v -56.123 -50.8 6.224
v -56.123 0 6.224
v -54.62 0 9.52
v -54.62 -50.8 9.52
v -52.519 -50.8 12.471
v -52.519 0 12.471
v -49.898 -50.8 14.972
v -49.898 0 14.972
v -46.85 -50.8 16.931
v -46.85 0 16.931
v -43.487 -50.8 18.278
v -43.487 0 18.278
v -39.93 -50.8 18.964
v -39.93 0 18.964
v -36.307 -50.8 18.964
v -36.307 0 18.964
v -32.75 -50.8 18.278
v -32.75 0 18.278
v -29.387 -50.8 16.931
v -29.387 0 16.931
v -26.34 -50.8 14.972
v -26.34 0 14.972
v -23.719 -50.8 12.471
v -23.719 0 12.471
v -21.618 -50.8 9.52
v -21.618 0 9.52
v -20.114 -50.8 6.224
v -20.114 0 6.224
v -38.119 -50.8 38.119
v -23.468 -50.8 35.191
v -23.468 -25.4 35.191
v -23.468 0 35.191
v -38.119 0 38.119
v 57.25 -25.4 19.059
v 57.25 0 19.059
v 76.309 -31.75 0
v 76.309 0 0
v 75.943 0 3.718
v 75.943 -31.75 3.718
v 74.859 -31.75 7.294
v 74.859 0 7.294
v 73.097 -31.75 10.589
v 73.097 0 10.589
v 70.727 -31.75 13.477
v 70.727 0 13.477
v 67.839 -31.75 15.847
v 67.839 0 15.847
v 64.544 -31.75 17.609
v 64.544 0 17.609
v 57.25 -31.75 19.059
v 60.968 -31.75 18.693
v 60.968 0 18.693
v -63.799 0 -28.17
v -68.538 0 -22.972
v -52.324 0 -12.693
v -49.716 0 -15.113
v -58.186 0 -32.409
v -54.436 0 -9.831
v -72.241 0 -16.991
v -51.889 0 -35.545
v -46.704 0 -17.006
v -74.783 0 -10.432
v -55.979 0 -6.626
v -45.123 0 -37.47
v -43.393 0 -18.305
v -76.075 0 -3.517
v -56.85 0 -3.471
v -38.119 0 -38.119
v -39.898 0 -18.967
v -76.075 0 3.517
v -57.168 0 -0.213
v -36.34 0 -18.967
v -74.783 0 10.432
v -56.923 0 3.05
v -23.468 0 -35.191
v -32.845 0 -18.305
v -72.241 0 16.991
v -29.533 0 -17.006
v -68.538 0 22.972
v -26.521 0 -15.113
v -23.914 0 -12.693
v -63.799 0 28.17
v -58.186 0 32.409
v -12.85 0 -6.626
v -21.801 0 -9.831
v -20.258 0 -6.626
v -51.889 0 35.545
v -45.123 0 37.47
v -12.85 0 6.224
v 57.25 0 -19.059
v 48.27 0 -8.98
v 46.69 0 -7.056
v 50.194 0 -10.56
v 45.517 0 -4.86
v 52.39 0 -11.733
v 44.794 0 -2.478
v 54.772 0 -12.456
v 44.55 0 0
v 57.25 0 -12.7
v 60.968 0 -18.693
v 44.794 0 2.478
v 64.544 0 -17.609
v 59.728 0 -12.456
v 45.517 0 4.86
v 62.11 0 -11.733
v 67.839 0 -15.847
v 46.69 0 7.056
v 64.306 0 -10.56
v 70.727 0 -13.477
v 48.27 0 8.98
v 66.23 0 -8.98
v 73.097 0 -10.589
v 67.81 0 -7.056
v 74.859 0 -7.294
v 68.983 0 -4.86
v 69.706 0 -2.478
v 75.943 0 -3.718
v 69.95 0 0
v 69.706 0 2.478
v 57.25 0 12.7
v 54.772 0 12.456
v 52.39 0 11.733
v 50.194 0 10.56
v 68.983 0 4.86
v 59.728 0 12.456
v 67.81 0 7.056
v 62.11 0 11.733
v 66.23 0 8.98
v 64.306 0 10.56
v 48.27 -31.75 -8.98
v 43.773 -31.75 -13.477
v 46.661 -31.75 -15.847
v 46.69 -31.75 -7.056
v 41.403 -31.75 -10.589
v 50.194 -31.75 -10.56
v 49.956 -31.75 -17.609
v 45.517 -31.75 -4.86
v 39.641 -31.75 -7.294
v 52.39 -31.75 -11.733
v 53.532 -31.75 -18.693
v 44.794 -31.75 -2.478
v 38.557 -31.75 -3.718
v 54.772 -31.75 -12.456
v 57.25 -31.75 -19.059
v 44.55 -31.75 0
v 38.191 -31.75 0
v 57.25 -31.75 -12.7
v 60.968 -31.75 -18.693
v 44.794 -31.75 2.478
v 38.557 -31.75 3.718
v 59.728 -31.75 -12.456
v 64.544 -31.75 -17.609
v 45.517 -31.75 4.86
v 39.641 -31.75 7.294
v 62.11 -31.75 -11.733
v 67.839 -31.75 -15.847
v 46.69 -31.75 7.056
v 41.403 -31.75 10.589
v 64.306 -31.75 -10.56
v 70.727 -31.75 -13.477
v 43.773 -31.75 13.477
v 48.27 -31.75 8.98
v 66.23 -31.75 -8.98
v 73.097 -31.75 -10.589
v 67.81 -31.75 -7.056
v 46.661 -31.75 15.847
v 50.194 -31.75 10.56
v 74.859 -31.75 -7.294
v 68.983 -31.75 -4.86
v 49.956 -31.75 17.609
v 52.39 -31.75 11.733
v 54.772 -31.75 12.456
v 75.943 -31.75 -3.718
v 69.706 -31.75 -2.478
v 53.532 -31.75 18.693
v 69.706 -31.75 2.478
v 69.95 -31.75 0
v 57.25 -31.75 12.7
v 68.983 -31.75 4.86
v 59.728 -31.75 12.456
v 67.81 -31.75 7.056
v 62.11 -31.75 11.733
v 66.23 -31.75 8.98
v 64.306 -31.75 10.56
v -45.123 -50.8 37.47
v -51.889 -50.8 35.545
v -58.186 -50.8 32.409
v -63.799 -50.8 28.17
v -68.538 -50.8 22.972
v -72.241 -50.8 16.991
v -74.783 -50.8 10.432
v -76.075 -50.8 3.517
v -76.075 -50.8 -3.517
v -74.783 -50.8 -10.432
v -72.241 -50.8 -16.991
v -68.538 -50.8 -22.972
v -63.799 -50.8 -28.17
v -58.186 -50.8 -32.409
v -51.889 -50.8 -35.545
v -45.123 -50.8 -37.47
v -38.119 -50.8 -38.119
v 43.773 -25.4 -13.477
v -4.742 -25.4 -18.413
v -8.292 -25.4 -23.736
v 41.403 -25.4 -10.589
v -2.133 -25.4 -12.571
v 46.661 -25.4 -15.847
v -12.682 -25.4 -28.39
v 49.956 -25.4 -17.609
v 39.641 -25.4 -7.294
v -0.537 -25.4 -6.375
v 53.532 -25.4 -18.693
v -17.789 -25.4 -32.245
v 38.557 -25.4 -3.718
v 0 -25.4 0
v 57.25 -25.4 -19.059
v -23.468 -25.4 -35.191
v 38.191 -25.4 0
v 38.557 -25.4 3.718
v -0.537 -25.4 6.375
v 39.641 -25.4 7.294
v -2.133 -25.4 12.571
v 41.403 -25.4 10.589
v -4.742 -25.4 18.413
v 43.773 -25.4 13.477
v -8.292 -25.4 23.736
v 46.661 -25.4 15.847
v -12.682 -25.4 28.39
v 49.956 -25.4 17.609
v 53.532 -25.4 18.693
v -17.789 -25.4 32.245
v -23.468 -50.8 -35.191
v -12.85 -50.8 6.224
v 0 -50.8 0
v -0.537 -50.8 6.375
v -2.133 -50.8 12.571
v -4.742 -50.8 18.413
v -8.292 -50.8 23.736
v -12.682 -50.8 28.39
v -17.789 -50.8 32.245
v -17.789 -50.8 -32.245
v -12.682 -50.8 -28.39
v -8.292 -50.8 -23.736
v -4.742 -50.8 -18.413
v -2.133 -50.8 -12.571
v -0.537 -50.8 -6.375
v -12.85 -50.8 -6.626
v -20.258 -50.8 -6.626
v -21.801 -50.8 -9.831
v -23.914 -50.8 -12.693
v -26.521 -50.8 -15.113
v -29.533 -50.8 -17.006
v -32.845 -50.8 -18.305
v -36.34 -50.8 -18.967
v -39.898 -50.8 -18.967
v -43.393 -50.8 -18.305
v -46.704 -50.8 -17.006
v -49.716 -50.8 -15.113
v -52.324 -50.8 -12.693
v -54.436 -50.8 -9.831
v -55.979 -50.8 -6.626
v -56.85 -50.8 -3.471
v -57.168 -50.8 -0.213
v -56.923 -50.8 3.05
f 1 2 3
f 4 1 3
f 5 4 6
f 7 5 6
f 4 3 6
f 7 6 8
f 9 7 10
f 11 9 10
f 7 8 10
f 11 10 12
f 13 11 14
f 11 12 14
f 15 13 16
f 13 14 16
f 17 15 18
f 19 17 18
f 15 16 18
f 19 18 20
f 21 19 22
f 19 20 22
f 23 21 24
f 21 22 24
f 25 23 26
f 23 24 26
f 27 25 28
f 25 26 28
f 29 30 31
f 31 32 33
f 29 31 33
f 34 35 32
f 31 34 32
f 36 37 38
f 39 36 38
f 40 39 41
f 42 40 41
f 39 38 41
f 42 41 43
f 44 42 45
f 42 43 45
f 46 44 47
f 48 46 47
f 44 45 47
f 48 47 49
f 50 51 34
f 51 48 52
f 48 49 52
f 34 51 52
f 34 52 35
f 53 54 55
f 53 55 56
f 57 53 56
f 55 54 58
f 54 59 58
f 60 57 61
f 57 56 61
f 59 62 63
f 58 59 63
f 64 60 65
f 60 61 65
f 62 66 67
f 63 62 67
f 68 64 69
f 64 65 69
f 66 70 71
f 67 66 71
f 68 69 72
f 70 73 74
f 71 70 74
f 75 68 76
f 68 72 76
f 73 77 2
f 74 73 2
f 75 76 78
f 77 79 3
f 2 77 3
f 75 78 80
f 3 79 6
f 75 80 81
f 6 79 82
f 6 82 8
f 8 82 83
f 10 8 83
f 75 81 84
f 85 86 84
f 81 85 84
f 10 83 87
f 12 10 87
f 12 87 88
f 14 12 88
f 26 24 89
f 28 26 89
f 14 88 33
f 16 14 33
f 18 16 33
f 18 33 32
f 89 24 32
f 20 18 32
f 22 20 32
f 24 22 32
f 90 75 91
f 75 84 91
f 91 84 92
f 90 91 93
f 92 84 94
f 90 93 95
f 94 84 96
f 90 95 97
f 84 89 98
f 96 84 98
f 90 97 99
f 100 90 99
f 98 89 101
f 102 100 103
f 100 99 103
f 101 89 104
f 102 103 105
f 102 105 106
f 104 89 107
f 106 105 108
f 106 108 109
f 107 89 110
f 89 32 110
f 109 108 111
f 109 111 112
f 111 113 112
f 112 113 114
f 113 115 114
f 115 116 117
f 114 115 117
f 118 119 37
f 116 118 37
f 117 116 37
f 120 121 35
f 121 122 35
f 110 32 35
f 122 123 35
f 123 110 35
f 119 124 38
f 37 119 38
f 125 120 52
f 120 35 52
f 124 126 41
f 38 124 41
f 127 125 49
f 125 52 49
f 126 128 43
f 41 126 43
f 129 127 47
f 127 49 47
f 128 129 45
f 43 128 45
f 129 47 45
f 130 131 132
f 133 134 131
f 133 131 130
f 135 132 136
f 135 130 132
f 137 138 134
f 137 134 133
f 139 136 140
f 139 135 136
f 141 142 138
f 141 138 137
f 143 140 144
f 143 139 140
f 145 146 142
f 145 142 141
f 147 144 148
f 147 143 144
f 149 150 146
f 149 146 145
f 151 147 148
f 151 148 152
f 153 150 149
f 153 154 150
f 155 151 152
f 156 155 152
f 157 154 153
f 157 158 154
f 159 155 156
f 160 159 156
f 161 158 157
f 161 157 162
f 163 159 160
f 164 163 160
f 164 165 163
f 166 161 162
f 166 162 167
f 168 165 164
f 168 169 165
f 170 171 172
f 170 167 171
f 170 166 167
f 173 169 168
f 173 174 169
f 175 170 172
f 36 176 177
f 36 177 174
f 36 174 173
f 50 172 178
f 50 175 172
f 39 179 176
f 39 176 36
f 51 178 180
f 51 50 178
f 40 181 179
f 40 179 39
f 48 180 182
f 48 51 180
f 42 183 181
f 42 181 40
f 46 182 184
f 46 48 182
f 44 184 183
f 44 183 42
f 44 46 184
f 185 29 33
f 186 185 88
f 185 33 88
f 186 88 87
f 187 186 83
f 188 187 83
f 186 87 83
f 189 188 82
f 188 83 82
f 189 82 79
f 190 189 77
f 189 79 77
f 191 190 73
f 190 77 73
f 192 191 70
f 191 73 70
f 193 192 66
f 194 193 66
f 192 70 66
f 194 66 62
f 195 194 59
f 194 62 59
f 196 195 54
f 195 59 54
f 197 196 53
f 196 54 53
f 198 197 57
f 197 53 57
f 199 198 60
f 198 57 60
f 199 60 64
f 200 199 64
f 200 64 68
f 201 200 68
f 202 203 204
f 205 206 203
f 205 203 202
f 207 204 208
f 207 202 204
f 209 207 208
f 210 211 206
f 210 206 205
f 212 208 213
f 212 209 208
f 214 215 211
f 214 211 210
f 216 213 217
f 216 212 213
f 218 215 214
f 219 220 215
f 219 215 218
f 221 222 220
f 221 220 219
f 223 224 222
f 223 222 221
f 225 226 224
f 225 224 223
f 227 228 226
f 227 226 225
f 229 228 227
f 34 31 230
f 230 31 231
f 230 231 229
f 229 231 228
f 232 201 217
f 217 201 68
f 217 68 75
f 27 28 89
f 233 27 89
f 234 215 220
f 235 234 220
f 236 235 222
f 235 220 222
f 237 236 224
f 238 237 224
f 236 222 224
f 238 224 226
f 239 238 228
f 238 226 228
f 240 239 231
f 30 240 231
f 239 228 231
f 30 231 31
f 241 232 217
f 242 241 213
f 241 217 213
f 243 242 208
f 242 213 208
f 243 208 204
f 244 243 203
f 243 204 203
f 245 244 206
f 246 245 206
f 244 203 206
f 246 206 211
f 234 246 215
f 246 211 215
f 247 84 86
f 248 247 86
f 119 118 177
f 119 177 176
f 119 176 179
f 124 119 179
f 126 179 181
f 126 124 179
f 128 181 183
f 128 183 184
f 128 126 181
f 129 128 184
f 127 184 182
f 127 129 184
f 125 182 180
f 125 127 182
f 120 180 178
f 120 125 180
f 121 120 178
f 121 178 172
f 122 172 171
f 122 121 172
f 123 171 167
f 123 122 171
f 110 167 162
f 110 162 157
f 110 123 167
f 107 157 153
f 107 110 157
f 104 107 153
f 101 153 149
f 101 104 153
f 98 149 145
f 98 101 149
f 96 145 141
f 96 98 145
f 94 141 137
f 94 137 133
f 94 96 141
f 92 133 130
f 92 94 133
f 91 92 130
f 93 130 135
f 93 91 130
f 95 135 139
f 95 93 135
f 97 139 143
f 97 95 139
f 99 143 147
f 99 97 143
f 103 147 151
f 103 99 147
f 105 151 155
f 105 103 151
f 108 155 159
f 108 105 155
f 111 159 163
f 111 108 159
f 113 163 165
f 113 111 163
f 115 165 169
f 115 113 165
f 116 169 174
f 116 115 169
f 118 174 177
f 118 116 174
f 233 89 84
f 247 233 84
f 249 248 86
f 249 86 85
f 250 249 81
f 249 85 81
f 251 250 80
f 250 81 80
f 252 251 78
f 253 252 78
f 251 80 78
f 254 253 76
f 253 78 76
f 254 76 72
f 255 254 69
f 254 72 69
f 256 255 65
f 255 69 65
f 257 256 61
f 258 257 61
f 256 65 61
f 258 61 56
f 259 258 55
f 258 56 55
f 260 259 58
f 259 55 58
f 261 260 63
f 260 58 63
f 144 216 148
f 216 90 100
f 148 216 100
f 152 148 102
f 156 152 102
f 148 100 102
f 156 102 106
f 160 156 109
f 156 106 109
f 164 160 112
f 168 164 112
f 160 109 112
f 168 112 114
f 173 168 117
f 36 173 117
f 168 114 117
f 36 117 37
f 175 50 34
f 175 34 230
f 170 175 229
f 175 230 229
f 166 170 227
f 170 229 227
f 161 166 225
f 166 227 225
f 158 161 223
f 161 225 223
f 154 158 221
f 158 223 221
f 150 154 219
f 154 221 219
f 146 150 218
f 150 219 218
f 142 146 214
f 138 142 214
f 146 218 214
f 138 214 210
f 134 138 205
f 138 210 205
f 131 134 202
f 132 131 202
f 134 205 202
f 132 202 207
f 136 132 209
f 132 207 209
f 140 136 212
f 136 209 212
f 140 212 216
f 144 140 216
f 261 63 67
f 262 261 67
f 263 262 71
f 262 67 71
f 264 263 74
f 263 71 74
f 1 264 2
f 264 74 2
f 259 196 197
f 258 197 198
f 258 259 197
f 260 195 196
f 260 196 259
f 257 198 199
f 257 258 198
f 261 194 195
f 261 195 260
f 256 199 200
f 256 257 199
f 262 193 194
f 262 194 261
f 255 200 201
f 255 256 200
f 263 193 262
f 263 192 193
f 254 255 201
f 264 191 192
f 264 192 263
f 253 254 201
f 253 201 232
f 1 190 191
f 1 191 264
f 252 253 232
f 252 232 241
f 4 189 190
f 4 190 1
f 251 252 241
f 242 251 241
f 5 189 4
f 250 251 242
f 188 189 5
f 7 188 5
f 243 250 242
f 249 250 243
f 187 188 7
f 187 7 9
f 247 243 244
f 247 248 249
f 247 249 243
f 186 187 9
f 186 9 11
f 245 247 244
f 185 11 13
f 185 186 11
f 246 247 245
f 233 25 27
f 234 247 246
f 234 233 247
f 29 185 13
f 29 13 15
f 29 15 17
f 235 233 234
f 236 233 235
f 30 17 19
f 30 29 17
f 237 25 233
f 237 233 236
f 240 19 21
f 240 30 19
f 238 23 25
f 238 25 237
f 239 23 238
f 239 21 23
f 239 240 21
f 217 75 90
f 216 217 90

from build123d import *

# Parameters (mm, degrees)
F1_DEPTH = 50.8
F2_DEPTH = 25.4
F0_R     = 12.7
F3_DEPTH = 31.75


with BuildPart() as f1:
    # F0 (on Front) → F1 (new body)
    with BuildSketch(Plane.XZ):
        with BuildLine():
            Line((-23.4679372151, 35.1908475518), (-38.1188419469, 38.1188242326))
            ThreePointArc((-38.1188419469, 38.1188242326), (-76.2376661794, 0), (-38.1188419469, -38.1188242326))
            Line((-38.1188419469, -38.1188242326), (-23.4679372151, -35.1908475518))
            ThreePointArc((-23.4679372151, -35.1908475518), (-6.4051223354, -21.1491075291), (-1.77143e-05, 0))
            ThreePointArc((-1.77143e-05, 0), (-6.4051223354, 21.1491075291), (-23.4679372151, 35.1908475518))
        make_face()
        with BuildLine():
            ThreePointArc((-55.9794965989, -6.6256709397), (-57.1676480455, -0.2132749771), (-56.123365877, 6.2241158448))
            ThreePointArc((-56.123365877, 6.2241158448), (-38.1188419468, 19.05), (-20.1143180167, 6.2241158448))
            Line((-20.1143180167, 6.2241158448), (-12.8497872502, 6.2241158448))
            Line((-12.8497872502, 6.2241158448), (-12.8497872502, -6.6256709397))
            Line((-12.8497872502, -6.6256709397), (-20.2581872948, -6.6256709397))
            ThreePointArc((-20.2581872948, -6.6256709397), (-38.1188419468, -19.05), (-55.9794965989, -6.6256709397))
        make_face(mode=Mode.SUBTRACT)
    extrude(amount=F1_DEPTH)

    # F0 (on Front) → F2 (join)
    with BuildSketch(Plane.XZ):
        with BuildLine():
            Line((57.2499610198, 19.0594121163), (-23.4679372151, 35.1908475518))
            ThreePointArc((-23.4679372151, 35.1908475518), (-6.4051223354, 21.1491075291), (-1.77143e-05, 0))
            ThreePointArc((-1.77143e-05, 0), (-6.4051223354, -21.1491075291), (-23.4679372151, -35.1908475518))
            Line((-23.4679372151, -35.1908475518), (57.2499610198, -19.0594121163))
            ThreePointArc((57.2499610198, -19.0594121163), (38.1905489035, 0), (57.2499610198, 19.0594121163))
        make_face()
    extrude(amount=F2_DEPTH)

    # F0 (on Front) → F3 (join)
    with BuildSketch(Plane.XZ):
        with BuildLine():
            ThreePointArc((76.309373136, 0), (70.7270005726, 13.4770395529), (57.2499610198, 19.0594121163))
            ThreePointArc((57.2499610198, 19.0594121163), (38.1905489035, 0), (57.2499610198, -19.0594121163))
            ThreePointArc((57.2499610198, -19.0594121163), (70.7270005726, -13.4770395529), (76.309373136, 0))
        make_face()
        with Locations((57.2499610198, 0)):
            Circle(F0_R, mode=Mode.SUBTRACT)
    extrude(amount=F3_DEPTH)


solid = f1.part
